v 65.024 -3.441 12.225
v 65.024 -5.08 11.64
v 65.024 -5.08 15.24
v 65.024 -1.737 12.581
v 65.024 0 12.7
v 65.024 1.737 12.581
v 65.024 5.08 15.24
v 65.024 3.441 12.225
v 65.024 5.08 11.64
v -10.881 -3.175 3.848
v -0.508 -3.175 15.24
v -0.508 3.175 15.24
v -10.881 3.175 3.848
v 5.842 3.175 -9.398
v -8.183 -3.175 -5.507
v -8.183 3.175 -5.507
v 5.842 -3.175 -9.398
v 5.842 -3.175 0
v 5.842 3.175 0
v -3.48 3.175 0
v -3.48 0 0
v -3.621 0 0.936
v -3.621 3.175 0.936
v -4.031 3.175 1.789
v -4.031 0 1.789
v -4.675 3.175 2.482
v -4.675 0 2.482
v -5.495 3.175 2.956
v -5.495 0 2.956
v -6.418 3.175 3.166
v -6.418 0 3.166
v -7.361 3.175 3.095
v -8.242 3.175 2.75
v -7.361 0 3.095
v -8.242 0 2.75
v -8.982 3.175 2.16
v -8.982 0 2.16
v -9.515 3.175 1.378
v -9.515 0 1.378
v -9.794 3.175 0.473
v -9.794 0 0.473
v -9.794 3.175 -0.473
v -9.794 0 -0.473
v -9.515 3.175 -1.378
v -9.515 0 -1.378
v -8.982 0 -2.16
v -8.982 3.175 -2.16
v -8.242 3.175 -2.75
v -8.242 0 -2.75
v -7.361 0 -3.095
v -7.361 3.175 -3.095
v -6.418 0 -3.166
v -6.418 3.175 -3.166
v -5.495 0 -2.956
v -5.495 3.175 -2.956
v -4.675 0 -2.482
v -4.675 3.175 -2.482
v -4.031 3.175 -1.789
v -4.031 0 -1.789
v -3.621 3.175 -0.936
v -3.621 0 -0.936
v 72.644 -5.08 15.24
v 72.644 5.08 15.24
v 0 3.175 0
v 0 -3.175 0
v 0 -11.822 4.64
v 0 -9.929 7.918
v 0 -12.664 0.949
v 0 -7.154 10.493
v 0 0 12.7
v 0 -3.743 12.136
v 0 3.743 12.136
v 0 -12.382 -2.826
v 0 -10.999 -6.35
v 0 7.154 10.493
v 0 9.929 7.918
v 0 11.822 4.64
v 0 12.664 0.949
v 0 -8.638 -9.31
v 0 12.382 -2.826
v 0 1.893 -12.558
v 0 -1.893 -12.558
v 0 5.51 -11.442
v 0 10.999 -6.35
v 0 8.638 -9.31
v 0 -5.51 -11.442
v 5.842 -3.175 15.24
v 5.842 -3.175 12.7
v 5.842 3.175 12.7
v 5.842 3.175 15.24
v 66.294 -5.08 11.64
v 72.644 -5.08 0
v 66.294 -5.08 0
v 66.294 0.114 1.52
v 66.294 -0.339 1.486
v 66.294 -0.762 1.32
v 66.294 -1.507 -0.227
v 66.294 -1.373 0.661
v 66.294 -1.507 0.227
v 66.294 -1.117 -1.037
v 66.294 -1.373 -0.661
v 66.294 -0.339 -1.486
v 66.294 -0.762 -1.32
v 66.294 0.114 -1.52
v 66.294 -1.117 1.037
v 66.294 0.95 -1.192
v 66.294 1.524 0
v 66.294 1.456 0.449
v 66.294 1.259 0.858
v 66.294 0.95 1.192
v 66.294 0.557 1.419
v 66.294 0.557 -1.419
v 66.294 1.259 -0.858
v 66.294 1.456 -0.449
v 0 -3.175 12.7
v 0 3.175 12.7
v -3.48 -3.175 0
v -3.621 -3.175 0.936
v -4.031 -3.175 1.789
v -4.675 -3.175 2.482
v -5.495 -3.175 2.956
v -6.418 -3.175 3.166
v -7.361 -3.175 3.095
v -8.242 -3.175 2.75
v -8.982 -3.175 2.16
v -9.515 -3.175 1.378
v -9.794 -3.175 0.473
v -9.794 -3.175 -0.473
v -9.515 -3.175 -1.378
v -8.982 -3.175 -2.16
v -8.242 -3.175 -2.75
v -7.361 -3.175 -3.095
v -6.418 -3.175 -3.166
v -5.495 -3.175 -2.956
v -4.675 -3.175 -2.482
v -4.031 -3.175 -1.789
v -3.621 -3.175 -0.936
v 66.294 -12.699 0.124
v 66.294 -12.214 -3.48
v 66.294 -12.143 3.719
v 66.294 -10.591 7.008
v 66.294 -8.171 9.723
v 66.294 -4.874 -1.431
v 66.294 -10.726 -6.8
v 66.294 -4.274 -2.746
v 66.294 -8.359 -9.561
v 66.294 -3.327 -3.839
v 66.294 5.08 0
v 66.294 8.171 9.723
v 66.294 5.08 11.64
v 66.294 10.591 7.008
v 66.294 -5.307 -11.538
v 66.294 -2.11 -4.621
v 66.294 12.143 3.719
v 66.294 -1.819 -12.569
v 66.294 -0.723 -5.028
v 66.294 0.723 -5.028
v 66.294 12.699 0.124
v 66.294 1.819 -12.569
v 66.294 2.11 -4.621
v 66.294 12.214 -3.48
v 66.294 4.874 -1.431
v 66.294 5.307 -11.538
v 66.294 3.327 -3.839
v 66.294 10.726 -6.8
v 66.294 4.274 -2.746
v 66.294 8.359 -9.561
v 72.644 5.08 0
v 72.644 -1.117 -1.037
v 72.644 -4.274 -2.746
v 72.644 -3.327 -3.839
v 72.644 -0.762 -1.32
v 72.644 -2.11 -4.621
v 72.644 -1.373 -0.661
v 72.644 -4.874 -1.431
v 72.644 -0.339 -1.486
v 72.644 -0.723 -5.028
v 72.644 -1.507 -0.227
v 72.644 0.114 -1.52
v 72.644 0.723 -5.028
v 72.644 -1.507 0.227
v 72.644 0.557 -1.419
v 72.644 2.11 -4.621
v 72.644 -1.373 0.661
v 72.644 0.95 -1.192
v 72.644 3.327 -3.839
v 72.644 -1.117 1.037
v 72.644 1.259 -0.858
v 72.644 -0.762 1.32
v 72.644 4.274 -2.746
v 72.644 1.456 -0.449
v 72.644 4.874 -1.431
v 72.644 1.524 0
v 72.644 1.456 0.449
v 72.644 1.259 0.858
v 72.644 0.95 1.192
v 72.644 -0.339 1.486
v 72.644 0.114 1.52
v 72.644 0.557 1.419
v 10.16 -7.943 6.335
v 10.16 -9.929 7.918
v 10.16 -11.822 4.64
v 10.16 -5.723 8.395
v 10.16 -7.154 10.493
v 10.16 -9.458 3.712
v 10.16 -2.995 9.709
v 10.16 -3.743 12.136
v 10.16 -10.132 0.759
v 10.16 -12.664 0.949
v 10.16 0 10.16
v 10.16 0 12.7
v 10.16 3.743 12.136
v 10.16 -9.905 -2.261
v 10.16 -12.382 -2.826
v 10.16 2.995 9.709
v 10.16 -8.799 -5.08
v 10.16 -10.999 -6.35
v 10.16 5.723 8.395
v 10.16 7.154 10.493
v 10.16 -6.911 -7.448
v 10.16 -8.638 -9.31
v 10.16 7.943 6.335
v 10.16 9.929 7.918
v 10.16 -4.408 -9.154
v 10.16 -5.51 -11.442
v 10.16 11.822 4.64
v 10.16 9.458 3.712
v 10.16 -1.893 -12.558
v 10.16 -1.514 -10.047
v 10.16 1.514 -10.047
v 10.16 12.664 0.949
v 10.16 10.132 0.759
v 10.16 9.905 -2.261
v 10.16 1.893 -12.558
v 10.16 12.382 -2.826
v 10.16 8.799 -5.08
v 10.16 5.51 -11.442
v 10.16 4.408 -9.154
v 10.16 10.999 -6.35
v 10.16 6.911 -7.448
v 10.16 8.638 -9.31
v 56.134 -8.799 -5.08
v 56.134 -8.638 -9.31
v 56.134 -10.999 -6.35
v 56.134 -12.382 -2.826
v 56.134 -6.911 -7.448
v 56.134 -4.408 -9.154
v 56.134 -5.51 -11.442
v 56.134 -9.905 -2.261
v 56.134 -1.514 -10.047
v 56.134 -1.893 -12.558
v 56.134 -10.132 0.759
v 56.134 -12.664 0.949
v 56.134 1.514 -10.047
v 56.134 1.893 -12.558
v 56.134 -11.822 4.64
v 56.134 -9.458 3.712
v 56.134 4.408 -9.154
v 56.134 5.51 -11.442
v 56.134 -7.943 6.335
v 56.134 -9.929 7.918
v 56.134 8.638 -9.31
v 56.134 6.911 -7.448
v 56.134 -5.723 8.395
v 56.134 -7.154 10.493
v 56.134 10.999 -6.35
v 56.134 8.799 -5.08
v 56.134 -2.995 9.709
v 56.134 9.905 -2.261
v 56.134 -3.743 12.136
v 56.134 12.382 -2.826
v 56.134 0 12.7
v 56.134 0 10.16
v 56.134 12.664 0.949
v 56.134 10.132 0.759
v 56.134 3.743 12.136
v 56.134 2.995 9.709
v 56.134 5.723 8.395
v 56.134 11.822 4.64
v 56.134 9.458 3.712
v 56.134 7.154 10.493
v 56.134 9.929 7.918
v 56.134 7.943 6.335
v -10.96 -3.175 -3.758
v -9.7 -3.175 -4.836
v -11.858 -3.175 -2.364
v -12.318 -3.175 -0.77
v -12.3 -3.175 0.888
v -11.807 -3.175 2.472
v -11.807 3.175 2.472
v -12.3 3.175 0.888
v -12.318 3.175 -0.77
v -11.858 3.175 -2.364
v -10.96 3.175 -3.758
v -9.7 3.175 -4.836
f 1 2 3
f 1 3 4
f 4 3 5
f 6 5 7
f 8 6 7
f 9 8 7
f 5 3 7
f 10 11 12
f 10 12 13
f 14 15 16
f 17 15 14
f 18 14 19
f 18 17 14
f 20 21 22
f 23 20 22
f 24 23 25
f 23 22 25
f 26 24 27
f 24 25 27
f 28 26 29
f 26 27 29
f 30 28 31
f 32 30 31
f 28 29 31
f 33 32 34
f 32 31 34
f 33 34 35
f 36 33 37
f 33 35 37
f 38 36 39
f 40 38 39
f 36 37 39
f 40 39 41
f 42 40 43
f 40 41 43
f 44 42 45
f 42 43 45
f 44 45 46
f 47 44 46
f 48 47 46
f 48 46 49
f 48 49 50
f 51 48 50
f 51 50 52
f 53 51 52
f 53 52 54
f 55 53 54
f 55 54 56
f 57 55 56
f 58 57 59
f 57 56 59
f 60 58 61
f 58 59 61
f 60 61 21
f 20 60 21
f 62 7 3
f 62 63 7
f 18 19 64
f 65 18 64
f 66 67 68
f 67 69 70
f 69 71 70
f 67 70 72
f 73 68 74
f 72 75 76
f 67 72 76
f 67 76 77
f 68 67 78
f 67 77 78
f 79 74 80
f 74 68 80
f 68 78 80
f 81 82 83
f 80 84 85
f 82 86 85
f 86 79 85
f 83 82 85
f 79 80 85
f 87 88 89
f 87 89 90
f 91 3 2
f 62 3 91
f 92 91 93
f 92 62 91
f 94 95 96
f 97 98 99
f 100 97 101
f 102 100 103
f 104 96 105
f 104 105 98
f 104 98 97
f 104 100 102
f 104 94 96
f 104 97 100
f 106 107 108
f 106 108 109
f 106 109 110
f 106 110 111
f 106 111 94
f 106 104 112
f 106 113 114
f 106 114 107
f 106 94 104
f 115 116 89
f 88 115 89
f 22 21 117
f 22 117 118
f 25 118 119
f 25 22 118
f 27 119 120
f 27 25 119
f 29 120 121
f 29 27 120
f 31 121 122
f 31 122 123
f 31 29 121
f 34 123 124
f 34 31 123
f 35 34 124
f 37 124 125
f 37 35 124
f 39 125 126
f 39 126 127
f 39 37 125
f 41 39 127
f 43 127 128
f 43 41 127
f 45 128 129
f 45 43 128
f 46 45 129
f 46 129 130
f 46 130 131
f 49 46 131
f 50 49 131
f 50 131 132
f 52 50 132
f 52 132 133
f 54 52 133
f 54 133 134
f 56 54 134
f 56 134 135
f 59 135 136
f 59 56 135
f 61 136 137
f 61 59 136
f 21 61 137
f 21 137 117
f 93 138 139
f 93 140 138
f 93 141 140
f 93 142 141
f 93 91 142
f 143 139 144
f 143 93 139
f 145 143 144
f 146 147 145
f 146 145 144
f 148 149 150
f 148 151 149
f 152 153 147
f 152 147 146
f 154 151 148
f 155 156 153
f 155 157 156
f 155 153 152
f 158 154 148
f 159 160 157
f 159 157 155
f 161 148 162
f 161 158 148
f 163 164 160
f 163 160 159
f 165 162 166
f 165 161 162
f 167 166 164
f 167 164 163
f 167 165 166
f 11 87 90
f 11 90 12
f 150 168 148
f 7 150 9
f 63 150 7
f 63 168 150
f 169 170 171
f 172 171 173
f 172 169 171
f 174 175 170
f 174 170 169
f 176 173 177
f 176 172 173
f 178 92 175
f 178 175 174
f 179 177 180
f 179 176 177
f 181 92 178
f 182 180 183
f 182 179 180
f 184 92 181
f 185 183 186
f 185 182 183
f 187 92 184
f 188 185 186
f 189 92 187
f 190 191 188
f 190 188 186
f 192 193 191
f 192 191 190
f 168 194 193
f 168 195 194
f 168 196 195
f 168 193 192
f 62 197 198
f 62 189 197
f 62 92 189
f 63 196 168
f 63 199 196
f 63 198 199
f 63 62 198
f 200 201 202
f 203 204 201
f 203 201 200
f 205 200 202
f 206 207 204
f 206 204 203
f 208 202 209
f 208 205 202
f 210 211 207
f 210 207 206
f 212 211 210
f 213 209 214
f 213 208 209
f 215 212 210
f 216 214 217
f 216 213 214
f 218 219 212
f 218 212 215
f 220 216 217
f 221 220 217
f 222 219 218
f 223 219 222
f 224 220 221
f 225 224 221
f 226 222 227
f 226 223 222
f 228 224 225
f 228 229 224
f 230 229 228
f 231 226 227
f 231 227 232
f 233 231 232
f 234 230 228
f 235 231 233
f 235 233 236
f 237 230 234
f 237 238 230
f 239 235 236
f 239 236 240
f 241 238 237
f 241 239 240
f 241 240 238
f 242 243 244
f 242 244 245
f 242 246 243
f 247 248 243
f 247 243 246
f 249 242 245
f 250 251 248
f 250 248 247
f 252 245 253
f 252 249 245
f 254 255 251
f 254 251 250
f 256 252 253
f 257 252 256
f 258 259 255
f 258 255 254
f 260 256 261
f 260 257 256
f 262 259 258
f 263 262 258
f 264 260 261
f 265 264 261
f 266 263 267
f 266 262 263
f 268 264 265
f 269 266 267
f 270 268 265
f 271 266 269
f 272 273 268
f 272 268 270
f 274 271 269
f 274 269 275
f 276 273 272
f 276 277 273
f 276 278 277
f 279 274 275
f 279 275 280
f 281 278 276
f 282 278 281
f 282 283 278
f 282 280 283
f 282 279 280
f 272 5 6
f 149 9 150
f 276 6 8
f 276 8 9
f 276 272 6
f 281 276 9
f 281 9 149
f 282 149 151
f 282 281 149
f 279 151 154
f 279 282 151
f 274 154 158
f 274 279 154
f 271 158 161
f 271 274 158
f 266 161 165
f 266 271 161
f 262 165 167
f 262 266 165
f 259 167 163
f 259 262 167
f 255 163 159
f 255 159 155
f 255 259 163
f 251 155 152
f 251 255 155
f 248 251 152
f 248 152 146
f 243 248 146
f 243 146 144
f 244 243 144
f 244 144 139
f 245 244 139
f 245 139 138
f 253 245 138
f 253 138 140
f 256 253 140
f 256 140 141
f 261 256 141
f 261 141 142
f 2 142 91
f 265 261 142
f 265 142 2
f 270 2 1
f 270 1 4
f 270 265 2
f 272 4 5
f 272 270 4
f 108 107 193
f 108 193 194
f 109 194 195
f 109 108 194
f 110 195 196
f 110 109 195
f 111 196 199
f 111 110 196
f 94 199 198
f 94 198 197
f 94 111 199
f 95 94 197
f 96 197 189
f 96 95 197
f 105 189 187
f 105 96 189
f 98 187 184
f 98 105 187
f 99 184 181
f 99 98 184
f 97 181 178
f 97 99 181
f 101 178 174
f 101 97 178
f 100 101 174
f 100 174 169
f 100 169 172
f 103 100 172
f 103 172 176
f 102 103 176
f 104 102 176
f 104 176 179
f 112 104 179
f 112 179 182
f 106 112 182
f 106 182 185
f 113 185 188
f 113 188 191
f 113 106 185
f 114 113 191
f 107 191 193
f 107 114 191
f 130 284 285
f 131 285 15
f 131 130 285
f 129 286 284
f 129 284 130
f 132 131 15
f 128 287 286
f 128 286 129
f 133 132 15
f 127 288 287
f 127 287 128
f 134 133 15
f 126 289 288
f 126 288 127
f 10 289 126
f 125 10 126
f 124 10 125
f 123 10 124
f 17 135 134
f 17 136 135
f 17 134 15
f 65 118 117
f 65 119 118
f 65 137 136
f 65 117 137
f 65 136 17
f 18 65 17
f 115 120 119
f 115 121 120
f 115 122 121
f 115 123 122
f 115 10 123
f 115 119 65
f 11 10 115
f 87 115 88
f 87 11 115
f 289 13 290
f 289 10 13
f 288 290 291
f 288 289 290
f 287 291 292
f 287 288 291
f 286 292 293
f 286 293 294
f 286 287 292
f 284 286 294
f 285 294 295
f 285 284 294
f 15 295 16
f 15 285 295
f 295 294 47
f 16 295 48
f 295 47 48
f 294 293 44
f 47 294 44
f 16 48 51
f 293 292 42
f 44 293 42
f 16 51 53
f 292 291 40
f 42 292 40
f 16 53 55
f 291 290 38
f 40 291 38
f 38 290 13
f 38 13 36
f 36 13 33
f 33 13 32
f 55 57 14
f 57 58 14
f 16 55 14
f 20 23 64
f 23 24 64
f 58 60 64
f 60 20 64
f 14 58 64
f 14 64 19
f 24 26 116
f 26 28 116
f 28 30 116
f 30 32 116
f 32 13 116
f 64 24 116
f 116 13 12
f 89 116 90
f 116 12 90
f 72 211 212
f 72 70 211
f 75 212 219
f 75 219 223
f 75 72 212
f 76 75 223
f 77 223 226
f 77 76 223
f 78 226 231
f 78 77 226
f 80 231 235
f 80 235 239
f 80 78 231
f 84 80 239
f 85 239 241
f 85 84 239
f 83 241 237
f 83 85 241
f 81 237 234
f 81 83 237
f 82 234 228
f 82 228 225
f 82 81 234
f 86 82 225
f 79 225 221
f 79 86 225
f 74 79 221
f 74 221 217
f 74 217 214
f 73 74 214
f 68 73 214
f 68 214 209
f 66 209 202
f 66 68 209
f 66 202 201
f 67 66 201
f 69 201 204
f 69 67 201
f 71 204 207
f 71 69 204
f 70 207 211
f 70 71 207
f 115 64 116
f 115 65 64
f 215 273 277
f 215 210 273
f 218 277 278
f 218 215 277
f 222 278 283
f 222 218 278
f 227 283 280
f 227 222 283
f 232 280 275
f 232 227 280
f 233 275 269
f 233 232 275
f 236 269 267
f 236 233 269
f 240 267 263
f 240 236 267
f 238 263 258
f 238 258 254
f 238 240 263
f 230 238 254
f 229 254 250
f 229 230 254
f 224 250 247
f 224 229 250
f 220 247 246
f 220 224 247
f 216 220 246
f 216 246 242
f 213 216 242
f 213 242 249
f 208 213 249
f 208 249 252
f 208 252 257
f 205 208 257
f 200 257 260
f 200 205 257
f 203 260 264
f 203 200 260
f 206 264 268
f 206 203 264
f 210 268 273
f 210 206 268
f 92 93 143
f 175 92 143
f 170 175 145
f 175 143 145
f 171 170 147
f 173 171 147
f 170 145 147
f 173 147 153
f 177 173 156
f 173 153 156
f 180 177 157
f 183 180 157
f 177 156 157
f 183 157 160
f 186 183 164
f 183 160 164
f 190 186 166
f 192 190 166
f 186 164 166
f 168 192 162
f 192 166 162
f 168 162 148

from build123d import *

# Parameters (mm, degrees)
F0_W          = 5.842
F0_H          = 12.7
F0_R          = 3.175
F2_DEPTH      = 3.175
F2_DEPTH_BACK = 3.175
F3_R          = 1.524
F4_DEPTH      = 6.35
F4_DEPTH_BACK = 1.27
F5_DEPTH      = 56.134


with BuildPart() as f1:
    # F0 (on Front) → F1 (revolve)
    with BuildSketch(Plane.XZ):
        Polygon((5.842, 12.7), (5.842, 0), (66.294, 0), (66.294, 12.7), (56.134, 12.7), (56.134, 10.16), (10.16, 10.16), (10.16, 12.7), align=None)
        with Locations((2.921, 6.35)):
            Rectangle(F0_W, F0_H)
    revolve(axis=Axis((33.147, 0, 0), (-1, 0, 0)))

    # F3 (on face) → F4 (join, two sides)
    with BuildSketch(Plane.YZ.offset(66.294)) as f4_sk:
        with BuildLine():
            ThreePointArc((-5.08, 11.6397422652), (0, 12.7), (5.08, 11.6397422652))
            Line((5.08, 11.6397422652), (5.08, 15.24))
            Line((5.08, 15.24), (-5.08, 15.24))
            Line((-5.08, 15.24), (-5.08, 11.6397422652))
        make_face()
        with BuildLine():
            ThreePointArc((-5.08, 0), (0, 5.08), (5.08, 0))
            Line((5.08, 0), (5.08, 11.6397422652))
            ThreePointArc((5.08, 11.6397422652), (0, 12.7), (-5.08, 11.6397422652))
            Line((-5.08, 11.6397422652), (-5.08, 0))
        make_face()
        with BuildLine():
            ThreePointArc((-5.08, 0), (0, -5.08), (5.08, 0))
            ThreePointArc((5.08, 0), (0, 5.08), (-5.08, 0))
        make_face()
        Circle(F3_R, mode=Mode.SUBTRACT)
    extrude(amount=F4_DEPTH)
    extrude(f4_sk.sketch, amount=-F4_DEPTH_BACK)

    # F5 (add, through all): a face of the model
    f5_faces = [f1.faces().sort_by_distance(p)[0] for p in [
        (66.294, 0, 0),
    ]]
    extrude(f5_faces, amount=-F5_DEPTH)


with BuildPart() as f2:
    # F0 (on Front) → F2 (new body, two sides)
    with BuildSketch(Plane.XZ) as f2_sk:
        with BuildLine():
            Line((-0.9398, 0), (0, 0))
            Line((0, 0), (0, 12.7))
            Line((0, 12.7), (5.842, 12.7))
            Line((5.842, 12.7), (5.842, 15.24))
            Line((5.842, 15.24), (-0.508, 15.24))
            Line((-0.508, 15.24), (-10.8806298187, 3.8475430269))
            ThreePointArc((-10.8806298187, 3.8475430269), (-4.5919612295, 5.3297205562), (-0.9398, 0))
        make_face()
        with BuildLine():
            Line((5.842, 0), (0, 0))
            Line((0, 0), (-0.9398, 0))
            ThreePointArc((-0.9398, 0), (-3.1957909266, -4.5493385486), (-8.1826630726, -5.5069827884))
            Line((-8.1826630726, -5.5069827884), (5.842, -9.398))
            Line((5.842, -9.398), (5.842, 0))
        make_face()
        with BuildLine():
            ThreePointArc((-8.1826630726, -5.5069827884), (-3.1957909266, -4.5493385486), (-0.9398, 0))
            ThreePointArc((-0.9398, 0), (-4.5919612295, 5.3297205562), (-10.8806298187, 3.8475430269))
            ThreePointArc((-10.8806298187, 3.8475430269), (-12.1459778134, -1.5837270034), (-8.1826630726, -5.5069827884))
        make_face()
        with Locations((-6.6548, 0)):
            Circle(F0_R, mode=Mode.SUBTRACT)
    extrude(amount=F2_DEPTH)
    extrude(f2_sk.sketch, amount=-F2_DEPTH_BACK)


solid = Compound([f1.part, f2.part])
